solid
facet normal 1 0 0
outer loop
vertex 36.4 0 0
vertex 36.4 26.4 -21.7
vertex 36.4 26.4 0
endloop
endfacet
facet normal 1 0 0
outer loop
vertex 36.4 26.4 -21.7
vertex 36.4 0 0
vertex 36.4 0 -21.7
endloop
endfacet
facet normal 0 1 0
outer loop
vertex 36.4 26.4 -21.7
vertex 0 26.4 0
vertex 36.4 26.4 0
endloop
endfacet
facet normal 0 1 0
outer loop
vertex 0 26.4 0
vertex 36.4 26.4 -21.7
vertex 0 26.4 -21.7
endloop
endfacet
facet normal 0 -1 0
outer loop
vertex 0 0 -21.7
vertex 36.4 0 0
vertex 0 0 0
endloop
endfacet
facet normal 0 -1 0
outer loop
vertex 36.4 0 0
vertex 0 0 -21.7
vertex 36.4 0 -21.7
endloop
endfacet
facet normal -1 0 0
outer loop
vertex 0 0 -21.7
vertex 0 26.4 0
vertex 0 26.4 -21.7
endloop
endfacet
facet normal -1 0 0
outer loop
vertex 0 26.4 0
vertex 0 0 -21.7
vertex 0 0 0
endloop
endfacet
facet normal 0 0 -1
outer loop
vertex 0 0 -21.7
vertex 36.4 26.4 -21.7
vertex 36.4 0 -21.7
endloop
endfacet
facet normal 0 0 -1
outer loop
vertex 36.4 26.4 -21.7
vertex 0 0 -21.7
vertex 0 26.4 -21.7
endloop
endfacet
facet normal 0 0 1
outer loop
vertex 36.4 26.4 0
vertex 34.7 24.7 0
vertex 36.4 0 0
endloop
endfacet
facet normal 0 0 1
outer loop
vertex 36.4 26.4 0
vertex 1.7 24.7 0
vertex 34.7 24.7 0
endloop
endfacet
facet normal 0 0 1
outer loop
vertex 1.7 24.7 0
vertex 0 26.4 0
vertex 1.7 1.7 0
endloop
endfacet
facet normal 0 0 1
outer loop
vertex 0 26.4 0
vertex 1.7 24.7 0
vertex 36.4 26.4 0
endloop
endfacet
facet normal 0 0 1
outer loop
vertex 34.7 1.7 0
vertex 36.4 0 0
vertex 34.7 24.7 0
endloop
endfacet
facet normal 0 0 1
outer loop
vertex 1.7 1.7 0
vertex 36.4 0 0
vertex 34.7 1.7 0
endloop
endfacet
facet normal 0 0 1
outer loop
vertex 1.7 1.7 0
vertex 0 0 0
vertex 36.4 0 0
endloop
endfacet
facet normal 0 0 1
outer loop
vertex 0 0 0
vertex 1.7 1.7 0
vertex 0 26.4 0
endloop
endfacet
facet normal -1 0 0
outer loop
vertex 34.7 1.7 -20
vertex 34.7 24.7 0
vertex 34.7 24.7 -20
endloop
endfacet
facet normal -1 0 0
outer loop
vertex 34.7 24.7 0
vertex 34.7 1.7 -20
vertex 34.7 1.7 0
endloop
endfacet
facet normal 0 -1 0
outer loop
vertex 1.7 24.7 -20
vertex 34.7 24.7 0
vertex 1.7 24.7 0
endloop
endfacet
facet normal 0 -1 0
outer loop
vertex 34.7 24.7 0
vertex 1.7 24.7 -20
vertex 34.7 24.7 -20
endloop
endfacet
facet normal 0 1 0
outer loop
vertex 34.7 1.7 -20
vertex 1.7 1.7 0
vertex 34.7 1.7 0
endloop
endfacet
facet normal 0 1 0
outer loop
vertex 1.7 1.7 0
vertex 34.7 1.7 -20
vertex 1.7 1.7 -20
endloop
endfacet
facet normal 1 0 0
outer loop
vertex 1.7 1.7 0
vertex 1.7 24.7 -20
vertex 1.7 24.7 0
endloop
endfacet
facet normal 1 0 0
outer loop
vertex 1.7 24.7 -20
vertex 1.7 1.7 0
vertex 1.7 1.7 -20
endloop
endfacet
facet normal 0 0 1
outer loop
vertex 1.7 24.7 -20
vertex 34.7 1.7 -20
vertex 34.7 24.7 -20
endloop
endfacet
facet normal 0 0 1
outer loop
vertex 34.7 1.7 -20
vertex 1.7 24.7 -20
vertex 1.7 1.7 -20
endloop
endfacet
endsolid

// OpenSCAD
//BruceWillis
t=1.7;
rotate([-90,0,0])
difference()
{
cube([33+t*2,20+t,23+t*2]);
  translate([t,0,t])
cube([33,20,23]);
 
}
